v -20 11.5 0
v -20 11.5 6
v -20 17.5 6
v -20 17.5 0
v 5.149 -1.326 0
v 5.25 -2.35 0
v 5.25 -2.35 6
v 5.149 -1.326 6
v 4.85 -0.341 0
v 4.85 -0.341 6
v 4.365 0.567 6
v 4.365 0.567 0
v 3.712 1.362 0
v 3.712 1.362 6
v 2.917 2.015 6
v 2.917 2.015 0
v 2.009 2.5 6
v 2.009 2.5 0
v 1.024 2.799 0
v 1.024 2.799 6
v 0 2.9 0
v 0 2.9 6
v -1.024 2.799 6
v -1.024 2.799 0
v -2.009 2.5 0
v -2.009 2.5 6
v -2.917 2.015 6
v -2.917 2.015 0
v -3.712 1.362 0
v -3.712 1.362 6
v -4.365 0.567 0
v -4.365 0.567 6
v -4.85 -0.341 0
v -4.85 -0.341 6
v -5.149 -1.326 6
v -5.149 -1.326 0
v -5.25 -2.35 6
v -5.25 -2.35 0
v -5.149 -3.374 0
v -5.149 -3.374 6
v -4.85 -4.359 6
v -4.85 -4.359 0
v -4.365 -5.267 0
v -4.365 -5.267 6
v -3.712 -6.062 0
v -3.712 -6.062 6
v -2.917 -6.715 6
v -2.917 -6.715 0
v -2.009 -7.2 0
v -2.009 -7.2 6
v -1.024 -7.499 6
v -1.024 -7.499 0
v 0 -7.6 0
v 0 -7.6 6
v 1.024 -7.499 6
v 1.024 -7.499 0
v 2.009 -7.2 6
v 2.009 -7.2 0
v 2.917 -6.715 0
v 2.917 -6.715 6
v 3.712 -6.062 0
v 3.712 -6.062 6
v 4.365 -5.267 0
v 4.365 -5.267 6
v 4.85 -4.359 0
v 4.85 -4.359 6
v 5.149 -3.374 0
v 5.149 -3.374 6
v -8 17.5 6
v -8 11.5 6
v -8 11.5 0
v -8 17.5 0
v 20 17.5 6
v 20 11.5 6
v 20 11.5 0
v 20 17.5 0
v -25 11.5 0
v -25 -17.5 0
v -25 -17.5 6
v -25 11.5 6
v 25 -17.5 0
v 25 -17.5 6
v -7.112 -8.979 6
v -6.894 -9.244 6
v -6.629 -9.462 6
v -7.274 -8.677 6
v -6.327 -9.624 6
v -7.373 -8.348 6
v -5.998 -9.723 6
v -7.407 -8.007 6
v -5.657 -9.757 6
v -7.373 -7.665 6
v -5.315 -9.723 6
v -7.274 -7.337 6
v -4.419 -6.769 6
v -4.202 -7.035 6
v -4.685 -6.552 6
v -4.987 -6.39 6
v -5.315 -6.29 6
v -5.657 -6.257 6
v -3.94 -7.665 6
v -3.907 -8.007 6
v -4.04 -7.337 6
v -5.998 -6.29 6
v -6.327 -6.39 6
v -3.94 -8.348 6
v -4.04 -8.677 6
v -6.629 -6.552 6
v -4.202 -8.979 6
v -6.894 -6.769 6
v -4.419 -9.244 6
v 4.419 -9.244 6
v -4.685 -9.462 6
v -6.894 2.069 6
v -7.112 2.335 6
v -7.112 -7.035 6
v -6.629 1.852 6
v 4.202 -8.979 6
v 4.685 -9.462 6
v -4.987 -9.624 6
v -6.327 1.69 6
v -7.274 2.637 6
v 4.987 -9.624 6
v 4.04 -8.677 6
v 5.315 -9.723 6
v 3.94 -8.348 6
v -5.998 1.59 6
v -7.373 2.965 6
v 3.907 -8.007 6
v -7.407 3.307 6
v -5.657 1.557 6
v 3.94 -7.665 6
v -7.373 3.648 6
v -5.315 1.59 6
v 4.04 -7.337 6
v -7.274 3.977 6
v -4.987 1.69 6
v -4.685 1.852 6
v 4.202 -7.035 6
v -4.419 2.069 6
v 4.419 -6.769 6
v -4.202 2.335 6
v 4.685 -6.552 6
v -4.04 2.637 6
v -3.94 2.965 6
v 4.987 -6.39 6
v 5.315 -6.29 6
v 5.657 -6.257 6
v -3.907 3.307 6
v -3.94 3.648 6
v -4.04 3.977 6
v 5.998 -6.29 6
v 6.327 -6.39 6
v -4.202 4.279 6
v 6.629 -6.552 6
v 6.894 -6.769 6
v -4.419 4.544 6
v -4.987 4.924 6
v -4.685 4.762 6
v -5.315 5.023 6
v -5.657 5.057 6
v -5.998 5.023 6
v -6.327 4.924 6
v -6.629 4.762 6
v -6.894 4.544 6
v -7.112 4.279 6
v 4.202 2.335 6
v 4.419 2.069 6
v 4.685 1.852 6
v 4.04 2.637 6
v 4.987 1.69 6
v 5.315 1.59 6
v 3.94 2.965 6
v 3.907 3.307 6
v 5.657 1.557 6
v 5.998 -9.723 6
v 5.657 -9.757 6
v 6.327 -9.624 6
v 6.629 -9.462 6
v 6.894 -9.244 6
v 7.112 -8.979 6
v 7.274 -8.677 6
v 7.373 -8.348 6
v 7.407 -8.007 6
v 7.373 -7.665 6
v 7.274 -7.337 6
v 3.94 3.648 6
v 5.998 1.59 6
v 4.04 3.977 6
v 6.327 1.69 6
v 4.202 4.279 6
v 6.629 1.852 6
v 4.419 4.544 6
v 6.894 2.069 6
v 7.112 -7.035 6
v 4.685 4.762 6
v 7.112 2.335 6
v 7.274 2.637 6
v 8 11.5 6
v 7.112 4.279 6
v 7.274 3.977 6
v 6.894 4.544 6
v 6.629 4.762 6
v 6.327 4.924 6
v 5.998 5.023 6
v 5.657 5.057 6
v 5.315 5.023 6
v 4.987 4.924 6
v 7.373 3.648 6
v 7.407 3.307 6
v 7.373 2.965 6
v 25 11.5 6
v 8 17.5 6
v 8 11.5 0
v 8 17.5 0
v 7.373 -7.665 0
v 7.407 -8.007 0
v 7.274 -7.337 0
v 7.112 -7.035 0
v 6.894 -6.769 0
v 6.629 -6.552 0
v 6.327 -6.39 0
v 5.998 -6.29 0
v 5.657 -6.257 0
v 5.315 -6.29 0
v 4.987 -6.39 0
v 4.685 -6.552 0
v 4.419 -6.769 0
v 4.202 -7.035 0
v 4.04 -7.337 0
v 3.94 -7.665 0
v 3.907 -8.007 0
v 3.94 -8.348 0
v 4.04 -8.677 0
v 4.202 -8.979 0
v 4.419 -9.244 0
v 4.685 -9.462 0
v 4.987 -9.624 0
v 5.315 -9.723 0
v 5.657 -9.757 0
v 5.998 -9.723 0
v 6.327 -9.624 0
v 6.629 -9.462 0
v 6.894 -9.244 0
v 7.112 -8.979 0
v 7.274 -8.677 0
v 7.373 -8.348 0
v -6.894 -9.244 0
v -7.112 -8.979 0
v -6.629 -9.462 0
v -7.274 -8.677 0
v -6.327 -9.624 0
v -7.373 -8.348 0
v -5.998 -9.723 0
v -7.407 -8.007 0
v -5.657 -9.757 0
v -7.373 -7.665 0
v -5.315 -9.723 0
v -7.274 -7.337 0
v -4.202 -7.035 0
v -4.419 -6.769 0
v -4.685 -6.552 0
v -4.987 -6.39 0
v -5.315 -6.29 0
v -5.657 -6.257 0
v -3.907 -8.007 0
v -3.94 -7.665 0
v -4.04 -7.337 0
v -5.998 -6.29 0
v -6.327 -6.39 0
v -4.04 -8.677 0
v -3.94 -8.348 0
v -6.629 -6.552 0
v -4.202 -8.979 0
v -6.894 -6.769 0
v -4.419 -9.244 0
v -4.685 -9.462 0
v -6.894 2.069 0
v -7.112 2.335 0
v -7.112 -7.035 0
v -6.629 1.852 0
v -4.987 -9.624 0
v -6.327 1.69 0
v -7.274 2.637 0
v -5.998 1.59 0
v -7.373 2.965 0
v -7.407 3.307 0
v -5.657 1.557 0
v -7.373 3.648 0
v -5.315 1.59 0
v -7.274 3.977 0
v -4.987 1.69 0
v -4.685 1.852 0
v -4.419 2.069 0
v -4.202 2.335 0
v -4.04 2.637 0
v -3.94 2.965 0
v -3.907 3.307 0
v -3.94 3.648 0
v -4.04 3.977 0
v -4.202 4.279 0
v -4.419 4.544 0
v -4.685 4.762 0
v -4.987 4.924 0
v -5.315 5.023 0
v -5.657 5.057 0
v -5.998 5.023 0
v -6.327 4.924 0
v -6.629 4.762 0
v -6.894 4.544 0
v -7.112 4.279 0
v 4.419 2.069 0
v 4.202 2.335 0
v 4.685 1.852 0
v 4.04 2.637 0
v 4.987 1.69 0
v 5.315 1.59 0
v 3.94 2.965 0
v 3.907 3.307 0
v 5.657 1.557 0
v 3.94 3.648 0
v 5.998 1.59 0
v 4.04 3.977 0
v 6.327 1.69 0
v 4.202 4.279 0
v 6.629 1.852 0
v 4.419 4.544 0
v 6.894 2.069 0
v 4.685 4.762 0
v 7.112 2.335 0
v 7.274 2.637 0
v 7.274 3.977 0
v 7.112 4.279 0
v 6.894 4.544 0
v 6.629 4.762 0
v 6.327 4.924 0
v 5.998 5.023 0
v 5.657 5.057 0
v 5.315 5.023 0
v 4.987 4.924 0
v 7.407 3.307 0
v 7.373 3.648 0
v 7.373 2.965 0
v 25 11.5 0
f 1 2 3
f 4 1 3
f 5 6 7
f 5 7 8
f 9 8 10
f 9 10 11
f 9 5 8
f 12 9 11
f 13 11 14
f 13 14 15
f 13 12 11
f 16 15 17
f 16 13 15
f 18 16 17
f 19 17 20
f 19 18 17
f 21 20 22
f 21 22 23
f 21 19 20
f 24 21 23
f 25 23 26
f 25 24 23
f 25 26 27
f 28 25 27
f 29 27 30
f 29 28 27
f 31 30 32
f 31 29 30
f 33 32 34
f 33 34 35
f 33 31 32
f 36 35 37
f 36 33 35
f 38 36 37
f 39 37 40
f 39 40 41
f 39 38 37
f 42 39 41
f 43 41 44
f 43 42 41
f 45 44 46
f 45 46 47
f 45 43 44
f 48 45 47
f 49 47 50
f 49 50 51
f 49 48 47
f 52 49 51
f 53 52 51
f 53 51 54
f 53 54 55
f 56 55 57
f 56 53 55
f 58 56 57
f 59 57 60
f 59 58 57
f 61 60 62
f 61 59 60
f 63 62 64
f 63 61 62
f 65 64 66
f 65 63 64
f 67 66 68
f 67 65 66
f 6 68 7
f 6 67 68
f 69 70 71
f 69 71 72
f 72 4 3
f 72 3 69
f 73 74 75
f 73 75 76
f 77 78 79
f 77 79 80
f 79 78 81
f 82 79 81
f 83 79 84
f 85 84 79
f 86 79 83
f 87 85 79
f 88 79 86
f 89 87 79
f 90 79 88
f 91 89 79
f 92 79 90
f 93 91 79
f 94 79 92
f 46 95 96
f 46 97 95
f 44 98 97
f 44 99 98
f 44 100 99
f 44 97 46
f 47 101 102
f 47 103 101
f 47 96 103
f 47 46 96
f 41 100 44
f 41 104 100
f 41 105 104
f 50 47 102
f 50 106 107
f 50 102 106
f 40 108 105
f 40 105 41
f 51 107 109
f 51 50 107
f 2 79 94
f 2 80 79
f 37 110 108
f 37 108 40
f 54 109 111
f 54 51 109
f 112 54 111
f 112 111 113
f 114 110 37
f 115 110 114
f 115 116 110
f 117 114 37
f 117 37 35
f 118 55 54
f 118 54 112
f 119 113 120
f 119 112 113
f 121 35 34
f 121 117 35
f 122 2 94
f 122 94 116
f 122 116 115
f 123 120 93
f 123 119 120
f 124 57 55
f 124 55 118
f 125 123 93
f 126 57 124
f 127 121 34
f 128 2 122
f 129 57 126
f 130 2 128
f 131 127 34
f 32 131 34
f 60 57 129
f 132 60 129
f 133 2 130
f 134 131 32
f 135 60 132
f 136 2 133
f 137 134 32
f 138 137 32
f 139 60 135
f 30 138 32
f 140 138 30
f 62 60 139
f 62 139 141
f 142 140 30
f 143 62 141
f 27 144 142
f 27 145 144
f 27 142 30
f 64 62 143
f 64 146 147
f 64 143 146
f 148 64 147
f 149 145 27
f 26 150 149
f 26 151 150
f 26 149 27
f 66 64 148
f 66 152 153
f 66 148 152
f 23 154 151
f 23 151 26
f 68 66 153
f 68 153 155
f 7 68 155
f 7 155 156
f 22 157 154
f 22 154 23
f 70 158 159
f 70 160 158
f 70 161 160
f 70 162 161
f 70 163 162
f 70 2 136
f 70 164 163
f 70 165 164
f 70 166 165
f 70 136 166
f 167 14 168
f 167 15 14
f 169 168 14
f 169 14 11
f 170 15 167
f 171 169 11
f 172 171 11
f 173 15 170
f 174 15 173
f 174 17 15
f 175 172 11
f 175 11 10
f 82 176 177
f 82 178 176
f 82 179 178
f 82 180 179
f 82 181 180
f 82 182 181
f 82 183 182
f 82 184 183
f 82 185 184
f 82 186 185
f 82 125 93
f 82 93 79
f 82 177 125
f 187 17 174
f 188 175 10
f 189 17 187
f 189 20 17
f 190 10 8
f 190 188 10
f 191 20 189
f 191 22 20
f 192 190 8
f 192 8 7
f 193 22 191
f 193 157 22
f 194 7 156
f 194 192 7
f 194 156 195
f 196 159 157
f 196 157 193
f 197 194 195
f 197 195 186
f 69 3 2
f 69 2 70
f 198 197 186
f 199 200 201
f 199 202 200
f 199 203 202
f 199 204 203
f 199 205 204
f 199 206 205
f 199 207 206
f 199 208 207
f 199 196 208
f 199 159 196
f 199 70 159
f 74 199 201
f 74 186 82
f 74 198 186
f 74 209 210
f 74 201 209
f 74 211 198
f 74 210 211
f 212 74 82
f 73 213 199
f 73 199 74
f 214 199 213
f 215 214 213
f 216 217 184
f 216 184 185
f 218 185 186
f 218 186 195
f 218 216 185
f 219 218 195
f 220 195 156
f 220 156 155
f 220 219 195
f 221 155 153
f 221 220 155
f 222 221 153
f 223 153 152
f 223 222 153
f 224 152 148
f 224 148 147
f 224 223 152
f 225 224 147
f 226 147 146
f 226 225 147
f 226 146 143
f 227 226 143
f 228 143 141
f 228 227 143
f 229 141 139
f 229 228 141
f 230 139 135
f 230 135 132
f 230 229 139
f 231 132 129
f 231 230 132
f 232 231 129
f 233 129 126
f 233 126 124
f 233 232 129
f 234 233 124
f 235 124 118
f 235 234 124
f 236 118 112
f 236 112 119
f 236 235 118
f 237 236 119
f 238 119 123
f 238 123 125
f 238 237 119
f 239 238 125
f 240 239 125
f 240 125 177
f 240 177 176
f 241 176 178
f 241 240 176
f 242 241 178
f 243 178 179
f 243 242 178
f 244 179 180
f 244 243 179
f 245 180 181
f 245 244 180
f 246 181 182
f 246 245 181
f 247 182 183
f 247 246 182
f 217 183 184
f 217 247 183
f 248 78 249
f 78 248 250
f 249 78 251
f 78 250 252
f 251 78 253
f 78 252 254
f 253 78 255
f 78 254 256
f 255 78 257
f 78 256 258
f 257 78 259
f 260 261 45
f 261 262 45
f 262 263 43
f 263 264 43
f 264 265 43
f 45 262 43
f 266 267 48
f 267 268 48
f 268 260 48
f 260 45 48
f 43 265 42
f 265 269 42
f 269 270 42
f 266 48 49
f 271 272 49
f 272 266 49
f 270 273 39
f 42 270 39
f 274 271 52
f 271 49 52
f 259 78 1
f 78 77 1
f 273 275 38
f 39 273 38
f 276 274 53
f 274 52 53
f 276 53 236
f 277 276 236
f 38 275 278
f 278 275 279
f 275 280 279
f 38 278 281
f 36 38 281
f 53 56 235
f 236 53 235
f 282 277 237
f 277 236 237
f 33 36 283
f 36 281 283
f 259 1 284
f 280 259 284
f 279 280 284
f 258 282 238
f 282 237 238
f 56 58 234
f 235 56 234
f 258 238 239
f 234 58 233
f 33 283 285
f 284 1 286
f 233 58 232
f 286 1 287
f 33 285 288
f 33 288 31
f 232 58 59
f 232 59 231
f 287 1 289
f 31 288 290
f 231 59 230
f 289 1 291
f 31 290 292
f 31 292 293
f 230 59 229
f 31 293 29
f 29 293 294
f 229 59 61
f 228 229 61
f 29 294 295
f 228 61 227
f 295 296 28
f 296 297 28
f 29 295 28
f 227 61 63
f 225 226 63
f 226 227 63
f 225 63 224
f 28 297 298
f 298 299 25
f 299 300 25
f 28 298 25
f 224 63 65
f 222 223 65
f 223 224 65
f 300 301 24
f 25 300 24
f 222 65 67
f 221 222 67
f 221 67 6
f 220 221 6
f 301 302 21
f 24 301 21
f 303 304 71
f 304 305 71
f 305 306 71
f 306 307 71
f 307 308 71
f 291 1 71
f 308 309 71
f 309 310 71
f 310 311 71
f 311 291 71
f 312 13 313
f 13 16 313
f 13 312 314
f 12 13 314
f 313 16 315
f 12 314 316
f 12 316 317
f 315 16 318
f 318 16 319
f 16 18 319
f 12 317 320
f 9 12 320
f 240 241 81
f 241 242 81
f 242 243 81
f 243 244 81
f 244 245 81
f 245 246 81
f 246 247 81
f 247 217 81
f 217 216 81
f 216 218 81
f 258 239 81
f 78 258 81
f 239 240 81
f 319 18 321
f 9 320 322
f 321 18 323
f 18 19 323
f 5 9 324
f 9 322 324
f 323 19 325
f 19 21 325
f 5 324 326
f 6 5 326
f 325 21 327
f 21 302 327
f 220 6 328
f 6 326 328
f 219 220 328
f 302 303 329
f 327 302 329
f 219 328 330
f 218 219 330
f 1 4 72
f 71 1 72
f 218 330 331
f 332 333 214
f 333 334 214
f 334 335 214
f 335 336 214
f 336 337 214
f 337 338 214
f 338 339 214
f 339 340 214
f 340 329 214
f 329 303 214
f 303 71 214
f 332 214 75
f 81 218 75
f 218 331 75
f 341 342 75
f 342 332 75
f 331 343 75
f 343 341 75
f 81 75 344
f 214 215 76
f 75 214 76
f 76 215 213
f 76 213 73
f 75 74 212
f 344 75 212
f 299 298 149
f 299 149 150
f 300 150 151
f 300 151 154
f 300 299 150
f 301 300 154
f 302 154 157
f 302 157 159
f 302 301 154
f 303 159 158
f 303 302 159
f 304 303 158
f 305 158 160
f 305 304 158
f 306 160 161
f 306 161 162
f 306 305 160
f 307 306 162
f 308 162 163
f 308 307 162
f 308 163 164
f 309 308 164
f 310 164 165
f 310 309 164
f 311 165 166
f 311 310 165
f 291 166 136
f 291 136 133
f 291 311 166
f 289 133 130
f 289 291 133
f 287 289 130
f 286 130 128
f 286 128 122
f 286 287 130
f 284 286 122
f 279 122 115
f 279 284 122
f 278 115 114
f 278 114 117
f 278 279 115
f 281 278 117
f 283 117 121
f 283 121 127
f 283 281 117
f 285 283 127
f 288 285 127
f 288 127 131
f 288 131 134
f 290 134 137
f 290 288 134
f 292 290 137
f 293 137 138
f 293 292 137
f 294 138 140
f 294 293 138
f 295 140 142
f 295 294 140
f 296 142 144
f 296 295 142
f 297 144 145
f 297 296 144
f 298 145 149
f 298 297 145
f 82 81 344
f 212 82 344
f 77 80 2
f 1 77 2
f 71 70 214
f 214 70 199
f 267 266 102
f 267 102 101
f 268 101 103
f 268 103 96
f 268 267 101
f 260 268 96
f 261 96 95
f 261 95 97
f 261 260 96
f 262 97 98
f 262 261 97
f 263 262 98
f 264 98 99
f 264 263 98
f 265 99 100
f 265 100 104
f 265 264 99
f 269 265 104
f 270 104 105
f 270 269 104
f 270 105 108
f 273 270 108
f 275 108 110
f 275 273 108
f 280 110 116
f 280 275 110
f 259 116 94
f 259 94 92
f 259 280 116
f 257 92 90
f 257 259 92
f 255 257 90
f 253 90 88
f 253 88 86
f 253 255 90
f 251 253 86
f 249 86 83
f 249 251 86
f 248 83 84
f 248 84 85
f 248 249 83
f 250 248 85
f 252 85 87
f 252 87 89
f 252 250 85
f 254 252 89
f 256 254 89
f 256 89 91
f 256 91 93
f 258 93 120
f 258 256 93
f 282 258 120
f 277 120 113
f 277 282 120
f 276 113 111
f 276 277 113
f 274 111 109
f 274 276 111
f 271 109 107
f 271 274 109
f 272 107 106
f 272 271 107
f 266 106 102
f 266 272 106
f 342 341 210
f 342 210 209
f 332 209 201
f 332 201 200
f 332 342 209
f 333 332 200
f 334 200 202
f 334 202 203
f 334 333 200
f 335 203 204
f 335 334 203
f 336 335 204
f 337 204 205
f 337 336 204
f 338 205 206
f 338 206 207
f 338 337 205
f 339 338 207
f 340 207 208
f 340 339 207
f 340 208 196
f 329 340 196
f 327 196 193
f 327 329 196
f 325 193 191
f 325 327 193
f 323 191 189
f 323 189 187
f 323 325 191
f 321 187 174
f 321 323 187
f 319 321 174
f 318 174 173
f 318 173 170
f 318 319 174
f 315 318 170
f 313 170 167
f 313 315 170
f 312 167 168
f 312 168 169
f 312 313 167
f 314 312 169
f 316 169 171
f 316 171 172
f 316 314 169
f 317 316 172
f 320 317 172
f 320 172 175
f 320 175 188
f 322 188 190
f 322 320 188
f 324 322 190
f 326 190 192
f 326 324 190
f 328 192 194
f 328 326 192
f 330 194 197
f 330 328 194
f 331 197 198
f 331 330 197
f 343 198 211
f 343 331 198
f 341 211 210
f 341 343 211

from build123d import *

# Parameters (mm, degrees)
ESBO_O1_W                = 50
ESBO_O1_H                = 35
ESBO_O1_R                = 5.25
ESBO_O1_R_2              = 1.75
RESSALTO_EXTRUS_O1_DEPTH = 6
ESBO_O2_W                = 16
ESBO_O2_H                = 6
ESBO_O2_W_2              = 5
CORTE_EXTRUS_O1_DEPTH    = 6


with BuildPart() as part:
    # Esboço1 → Ressalto-extrusão1 (new body)
    with BuildSketch(Plane.XY):
        Rectangle(ESBO_O1_W, ESBO_O1_H)
        with Locations((0, -2.35)):
            Circle(ESBO_O1_R, mode=Mode.SUBTRACT)
        with Locations((5.656854249, 3.306854249)):
            Circle(ESBO_O1_R_2, mode=Mode.SUBTRACT)
        with Locations((-5.656854249, 3.306854249)):
            Circle(ESBO_O1_R_2, mode=Mode.SUBTRACT)
        with Locations((-5.656854249, -8.006854249)):
            Circle(ESBO_O1_R_2, mode=Mode.SUBTRACT)
        with Locations((5.656854249, -8.006854249)):
            Circle(ESBO_O1_R_2, mode=Mode.SUBTRACT)
    extrude(amount=RESSALTO_EXTRUS_O1_DEPTH)

    # Esboço2 → Corte-extrusão1 (cut)
    with BuildSketch(Plane.XY.offset(6)):
        with Locations((0, 14.5)):
            Rectangle(ESBO_O2_W, ESBO_O2_H)
        with Locations((-22.5, 14.5)):
            Rectangle(ESBO_O2_W_2, ESBO_O2_H)
        with Locations((22.5, 14.5)):
            Rectangle(ESBO_O2_W_2, ESBO_O2_H)
    extrude(amount=-CORTE_EXTRUS_O1_DEPTH, mode=Mode.SUBTRACT)


solid = part.part
